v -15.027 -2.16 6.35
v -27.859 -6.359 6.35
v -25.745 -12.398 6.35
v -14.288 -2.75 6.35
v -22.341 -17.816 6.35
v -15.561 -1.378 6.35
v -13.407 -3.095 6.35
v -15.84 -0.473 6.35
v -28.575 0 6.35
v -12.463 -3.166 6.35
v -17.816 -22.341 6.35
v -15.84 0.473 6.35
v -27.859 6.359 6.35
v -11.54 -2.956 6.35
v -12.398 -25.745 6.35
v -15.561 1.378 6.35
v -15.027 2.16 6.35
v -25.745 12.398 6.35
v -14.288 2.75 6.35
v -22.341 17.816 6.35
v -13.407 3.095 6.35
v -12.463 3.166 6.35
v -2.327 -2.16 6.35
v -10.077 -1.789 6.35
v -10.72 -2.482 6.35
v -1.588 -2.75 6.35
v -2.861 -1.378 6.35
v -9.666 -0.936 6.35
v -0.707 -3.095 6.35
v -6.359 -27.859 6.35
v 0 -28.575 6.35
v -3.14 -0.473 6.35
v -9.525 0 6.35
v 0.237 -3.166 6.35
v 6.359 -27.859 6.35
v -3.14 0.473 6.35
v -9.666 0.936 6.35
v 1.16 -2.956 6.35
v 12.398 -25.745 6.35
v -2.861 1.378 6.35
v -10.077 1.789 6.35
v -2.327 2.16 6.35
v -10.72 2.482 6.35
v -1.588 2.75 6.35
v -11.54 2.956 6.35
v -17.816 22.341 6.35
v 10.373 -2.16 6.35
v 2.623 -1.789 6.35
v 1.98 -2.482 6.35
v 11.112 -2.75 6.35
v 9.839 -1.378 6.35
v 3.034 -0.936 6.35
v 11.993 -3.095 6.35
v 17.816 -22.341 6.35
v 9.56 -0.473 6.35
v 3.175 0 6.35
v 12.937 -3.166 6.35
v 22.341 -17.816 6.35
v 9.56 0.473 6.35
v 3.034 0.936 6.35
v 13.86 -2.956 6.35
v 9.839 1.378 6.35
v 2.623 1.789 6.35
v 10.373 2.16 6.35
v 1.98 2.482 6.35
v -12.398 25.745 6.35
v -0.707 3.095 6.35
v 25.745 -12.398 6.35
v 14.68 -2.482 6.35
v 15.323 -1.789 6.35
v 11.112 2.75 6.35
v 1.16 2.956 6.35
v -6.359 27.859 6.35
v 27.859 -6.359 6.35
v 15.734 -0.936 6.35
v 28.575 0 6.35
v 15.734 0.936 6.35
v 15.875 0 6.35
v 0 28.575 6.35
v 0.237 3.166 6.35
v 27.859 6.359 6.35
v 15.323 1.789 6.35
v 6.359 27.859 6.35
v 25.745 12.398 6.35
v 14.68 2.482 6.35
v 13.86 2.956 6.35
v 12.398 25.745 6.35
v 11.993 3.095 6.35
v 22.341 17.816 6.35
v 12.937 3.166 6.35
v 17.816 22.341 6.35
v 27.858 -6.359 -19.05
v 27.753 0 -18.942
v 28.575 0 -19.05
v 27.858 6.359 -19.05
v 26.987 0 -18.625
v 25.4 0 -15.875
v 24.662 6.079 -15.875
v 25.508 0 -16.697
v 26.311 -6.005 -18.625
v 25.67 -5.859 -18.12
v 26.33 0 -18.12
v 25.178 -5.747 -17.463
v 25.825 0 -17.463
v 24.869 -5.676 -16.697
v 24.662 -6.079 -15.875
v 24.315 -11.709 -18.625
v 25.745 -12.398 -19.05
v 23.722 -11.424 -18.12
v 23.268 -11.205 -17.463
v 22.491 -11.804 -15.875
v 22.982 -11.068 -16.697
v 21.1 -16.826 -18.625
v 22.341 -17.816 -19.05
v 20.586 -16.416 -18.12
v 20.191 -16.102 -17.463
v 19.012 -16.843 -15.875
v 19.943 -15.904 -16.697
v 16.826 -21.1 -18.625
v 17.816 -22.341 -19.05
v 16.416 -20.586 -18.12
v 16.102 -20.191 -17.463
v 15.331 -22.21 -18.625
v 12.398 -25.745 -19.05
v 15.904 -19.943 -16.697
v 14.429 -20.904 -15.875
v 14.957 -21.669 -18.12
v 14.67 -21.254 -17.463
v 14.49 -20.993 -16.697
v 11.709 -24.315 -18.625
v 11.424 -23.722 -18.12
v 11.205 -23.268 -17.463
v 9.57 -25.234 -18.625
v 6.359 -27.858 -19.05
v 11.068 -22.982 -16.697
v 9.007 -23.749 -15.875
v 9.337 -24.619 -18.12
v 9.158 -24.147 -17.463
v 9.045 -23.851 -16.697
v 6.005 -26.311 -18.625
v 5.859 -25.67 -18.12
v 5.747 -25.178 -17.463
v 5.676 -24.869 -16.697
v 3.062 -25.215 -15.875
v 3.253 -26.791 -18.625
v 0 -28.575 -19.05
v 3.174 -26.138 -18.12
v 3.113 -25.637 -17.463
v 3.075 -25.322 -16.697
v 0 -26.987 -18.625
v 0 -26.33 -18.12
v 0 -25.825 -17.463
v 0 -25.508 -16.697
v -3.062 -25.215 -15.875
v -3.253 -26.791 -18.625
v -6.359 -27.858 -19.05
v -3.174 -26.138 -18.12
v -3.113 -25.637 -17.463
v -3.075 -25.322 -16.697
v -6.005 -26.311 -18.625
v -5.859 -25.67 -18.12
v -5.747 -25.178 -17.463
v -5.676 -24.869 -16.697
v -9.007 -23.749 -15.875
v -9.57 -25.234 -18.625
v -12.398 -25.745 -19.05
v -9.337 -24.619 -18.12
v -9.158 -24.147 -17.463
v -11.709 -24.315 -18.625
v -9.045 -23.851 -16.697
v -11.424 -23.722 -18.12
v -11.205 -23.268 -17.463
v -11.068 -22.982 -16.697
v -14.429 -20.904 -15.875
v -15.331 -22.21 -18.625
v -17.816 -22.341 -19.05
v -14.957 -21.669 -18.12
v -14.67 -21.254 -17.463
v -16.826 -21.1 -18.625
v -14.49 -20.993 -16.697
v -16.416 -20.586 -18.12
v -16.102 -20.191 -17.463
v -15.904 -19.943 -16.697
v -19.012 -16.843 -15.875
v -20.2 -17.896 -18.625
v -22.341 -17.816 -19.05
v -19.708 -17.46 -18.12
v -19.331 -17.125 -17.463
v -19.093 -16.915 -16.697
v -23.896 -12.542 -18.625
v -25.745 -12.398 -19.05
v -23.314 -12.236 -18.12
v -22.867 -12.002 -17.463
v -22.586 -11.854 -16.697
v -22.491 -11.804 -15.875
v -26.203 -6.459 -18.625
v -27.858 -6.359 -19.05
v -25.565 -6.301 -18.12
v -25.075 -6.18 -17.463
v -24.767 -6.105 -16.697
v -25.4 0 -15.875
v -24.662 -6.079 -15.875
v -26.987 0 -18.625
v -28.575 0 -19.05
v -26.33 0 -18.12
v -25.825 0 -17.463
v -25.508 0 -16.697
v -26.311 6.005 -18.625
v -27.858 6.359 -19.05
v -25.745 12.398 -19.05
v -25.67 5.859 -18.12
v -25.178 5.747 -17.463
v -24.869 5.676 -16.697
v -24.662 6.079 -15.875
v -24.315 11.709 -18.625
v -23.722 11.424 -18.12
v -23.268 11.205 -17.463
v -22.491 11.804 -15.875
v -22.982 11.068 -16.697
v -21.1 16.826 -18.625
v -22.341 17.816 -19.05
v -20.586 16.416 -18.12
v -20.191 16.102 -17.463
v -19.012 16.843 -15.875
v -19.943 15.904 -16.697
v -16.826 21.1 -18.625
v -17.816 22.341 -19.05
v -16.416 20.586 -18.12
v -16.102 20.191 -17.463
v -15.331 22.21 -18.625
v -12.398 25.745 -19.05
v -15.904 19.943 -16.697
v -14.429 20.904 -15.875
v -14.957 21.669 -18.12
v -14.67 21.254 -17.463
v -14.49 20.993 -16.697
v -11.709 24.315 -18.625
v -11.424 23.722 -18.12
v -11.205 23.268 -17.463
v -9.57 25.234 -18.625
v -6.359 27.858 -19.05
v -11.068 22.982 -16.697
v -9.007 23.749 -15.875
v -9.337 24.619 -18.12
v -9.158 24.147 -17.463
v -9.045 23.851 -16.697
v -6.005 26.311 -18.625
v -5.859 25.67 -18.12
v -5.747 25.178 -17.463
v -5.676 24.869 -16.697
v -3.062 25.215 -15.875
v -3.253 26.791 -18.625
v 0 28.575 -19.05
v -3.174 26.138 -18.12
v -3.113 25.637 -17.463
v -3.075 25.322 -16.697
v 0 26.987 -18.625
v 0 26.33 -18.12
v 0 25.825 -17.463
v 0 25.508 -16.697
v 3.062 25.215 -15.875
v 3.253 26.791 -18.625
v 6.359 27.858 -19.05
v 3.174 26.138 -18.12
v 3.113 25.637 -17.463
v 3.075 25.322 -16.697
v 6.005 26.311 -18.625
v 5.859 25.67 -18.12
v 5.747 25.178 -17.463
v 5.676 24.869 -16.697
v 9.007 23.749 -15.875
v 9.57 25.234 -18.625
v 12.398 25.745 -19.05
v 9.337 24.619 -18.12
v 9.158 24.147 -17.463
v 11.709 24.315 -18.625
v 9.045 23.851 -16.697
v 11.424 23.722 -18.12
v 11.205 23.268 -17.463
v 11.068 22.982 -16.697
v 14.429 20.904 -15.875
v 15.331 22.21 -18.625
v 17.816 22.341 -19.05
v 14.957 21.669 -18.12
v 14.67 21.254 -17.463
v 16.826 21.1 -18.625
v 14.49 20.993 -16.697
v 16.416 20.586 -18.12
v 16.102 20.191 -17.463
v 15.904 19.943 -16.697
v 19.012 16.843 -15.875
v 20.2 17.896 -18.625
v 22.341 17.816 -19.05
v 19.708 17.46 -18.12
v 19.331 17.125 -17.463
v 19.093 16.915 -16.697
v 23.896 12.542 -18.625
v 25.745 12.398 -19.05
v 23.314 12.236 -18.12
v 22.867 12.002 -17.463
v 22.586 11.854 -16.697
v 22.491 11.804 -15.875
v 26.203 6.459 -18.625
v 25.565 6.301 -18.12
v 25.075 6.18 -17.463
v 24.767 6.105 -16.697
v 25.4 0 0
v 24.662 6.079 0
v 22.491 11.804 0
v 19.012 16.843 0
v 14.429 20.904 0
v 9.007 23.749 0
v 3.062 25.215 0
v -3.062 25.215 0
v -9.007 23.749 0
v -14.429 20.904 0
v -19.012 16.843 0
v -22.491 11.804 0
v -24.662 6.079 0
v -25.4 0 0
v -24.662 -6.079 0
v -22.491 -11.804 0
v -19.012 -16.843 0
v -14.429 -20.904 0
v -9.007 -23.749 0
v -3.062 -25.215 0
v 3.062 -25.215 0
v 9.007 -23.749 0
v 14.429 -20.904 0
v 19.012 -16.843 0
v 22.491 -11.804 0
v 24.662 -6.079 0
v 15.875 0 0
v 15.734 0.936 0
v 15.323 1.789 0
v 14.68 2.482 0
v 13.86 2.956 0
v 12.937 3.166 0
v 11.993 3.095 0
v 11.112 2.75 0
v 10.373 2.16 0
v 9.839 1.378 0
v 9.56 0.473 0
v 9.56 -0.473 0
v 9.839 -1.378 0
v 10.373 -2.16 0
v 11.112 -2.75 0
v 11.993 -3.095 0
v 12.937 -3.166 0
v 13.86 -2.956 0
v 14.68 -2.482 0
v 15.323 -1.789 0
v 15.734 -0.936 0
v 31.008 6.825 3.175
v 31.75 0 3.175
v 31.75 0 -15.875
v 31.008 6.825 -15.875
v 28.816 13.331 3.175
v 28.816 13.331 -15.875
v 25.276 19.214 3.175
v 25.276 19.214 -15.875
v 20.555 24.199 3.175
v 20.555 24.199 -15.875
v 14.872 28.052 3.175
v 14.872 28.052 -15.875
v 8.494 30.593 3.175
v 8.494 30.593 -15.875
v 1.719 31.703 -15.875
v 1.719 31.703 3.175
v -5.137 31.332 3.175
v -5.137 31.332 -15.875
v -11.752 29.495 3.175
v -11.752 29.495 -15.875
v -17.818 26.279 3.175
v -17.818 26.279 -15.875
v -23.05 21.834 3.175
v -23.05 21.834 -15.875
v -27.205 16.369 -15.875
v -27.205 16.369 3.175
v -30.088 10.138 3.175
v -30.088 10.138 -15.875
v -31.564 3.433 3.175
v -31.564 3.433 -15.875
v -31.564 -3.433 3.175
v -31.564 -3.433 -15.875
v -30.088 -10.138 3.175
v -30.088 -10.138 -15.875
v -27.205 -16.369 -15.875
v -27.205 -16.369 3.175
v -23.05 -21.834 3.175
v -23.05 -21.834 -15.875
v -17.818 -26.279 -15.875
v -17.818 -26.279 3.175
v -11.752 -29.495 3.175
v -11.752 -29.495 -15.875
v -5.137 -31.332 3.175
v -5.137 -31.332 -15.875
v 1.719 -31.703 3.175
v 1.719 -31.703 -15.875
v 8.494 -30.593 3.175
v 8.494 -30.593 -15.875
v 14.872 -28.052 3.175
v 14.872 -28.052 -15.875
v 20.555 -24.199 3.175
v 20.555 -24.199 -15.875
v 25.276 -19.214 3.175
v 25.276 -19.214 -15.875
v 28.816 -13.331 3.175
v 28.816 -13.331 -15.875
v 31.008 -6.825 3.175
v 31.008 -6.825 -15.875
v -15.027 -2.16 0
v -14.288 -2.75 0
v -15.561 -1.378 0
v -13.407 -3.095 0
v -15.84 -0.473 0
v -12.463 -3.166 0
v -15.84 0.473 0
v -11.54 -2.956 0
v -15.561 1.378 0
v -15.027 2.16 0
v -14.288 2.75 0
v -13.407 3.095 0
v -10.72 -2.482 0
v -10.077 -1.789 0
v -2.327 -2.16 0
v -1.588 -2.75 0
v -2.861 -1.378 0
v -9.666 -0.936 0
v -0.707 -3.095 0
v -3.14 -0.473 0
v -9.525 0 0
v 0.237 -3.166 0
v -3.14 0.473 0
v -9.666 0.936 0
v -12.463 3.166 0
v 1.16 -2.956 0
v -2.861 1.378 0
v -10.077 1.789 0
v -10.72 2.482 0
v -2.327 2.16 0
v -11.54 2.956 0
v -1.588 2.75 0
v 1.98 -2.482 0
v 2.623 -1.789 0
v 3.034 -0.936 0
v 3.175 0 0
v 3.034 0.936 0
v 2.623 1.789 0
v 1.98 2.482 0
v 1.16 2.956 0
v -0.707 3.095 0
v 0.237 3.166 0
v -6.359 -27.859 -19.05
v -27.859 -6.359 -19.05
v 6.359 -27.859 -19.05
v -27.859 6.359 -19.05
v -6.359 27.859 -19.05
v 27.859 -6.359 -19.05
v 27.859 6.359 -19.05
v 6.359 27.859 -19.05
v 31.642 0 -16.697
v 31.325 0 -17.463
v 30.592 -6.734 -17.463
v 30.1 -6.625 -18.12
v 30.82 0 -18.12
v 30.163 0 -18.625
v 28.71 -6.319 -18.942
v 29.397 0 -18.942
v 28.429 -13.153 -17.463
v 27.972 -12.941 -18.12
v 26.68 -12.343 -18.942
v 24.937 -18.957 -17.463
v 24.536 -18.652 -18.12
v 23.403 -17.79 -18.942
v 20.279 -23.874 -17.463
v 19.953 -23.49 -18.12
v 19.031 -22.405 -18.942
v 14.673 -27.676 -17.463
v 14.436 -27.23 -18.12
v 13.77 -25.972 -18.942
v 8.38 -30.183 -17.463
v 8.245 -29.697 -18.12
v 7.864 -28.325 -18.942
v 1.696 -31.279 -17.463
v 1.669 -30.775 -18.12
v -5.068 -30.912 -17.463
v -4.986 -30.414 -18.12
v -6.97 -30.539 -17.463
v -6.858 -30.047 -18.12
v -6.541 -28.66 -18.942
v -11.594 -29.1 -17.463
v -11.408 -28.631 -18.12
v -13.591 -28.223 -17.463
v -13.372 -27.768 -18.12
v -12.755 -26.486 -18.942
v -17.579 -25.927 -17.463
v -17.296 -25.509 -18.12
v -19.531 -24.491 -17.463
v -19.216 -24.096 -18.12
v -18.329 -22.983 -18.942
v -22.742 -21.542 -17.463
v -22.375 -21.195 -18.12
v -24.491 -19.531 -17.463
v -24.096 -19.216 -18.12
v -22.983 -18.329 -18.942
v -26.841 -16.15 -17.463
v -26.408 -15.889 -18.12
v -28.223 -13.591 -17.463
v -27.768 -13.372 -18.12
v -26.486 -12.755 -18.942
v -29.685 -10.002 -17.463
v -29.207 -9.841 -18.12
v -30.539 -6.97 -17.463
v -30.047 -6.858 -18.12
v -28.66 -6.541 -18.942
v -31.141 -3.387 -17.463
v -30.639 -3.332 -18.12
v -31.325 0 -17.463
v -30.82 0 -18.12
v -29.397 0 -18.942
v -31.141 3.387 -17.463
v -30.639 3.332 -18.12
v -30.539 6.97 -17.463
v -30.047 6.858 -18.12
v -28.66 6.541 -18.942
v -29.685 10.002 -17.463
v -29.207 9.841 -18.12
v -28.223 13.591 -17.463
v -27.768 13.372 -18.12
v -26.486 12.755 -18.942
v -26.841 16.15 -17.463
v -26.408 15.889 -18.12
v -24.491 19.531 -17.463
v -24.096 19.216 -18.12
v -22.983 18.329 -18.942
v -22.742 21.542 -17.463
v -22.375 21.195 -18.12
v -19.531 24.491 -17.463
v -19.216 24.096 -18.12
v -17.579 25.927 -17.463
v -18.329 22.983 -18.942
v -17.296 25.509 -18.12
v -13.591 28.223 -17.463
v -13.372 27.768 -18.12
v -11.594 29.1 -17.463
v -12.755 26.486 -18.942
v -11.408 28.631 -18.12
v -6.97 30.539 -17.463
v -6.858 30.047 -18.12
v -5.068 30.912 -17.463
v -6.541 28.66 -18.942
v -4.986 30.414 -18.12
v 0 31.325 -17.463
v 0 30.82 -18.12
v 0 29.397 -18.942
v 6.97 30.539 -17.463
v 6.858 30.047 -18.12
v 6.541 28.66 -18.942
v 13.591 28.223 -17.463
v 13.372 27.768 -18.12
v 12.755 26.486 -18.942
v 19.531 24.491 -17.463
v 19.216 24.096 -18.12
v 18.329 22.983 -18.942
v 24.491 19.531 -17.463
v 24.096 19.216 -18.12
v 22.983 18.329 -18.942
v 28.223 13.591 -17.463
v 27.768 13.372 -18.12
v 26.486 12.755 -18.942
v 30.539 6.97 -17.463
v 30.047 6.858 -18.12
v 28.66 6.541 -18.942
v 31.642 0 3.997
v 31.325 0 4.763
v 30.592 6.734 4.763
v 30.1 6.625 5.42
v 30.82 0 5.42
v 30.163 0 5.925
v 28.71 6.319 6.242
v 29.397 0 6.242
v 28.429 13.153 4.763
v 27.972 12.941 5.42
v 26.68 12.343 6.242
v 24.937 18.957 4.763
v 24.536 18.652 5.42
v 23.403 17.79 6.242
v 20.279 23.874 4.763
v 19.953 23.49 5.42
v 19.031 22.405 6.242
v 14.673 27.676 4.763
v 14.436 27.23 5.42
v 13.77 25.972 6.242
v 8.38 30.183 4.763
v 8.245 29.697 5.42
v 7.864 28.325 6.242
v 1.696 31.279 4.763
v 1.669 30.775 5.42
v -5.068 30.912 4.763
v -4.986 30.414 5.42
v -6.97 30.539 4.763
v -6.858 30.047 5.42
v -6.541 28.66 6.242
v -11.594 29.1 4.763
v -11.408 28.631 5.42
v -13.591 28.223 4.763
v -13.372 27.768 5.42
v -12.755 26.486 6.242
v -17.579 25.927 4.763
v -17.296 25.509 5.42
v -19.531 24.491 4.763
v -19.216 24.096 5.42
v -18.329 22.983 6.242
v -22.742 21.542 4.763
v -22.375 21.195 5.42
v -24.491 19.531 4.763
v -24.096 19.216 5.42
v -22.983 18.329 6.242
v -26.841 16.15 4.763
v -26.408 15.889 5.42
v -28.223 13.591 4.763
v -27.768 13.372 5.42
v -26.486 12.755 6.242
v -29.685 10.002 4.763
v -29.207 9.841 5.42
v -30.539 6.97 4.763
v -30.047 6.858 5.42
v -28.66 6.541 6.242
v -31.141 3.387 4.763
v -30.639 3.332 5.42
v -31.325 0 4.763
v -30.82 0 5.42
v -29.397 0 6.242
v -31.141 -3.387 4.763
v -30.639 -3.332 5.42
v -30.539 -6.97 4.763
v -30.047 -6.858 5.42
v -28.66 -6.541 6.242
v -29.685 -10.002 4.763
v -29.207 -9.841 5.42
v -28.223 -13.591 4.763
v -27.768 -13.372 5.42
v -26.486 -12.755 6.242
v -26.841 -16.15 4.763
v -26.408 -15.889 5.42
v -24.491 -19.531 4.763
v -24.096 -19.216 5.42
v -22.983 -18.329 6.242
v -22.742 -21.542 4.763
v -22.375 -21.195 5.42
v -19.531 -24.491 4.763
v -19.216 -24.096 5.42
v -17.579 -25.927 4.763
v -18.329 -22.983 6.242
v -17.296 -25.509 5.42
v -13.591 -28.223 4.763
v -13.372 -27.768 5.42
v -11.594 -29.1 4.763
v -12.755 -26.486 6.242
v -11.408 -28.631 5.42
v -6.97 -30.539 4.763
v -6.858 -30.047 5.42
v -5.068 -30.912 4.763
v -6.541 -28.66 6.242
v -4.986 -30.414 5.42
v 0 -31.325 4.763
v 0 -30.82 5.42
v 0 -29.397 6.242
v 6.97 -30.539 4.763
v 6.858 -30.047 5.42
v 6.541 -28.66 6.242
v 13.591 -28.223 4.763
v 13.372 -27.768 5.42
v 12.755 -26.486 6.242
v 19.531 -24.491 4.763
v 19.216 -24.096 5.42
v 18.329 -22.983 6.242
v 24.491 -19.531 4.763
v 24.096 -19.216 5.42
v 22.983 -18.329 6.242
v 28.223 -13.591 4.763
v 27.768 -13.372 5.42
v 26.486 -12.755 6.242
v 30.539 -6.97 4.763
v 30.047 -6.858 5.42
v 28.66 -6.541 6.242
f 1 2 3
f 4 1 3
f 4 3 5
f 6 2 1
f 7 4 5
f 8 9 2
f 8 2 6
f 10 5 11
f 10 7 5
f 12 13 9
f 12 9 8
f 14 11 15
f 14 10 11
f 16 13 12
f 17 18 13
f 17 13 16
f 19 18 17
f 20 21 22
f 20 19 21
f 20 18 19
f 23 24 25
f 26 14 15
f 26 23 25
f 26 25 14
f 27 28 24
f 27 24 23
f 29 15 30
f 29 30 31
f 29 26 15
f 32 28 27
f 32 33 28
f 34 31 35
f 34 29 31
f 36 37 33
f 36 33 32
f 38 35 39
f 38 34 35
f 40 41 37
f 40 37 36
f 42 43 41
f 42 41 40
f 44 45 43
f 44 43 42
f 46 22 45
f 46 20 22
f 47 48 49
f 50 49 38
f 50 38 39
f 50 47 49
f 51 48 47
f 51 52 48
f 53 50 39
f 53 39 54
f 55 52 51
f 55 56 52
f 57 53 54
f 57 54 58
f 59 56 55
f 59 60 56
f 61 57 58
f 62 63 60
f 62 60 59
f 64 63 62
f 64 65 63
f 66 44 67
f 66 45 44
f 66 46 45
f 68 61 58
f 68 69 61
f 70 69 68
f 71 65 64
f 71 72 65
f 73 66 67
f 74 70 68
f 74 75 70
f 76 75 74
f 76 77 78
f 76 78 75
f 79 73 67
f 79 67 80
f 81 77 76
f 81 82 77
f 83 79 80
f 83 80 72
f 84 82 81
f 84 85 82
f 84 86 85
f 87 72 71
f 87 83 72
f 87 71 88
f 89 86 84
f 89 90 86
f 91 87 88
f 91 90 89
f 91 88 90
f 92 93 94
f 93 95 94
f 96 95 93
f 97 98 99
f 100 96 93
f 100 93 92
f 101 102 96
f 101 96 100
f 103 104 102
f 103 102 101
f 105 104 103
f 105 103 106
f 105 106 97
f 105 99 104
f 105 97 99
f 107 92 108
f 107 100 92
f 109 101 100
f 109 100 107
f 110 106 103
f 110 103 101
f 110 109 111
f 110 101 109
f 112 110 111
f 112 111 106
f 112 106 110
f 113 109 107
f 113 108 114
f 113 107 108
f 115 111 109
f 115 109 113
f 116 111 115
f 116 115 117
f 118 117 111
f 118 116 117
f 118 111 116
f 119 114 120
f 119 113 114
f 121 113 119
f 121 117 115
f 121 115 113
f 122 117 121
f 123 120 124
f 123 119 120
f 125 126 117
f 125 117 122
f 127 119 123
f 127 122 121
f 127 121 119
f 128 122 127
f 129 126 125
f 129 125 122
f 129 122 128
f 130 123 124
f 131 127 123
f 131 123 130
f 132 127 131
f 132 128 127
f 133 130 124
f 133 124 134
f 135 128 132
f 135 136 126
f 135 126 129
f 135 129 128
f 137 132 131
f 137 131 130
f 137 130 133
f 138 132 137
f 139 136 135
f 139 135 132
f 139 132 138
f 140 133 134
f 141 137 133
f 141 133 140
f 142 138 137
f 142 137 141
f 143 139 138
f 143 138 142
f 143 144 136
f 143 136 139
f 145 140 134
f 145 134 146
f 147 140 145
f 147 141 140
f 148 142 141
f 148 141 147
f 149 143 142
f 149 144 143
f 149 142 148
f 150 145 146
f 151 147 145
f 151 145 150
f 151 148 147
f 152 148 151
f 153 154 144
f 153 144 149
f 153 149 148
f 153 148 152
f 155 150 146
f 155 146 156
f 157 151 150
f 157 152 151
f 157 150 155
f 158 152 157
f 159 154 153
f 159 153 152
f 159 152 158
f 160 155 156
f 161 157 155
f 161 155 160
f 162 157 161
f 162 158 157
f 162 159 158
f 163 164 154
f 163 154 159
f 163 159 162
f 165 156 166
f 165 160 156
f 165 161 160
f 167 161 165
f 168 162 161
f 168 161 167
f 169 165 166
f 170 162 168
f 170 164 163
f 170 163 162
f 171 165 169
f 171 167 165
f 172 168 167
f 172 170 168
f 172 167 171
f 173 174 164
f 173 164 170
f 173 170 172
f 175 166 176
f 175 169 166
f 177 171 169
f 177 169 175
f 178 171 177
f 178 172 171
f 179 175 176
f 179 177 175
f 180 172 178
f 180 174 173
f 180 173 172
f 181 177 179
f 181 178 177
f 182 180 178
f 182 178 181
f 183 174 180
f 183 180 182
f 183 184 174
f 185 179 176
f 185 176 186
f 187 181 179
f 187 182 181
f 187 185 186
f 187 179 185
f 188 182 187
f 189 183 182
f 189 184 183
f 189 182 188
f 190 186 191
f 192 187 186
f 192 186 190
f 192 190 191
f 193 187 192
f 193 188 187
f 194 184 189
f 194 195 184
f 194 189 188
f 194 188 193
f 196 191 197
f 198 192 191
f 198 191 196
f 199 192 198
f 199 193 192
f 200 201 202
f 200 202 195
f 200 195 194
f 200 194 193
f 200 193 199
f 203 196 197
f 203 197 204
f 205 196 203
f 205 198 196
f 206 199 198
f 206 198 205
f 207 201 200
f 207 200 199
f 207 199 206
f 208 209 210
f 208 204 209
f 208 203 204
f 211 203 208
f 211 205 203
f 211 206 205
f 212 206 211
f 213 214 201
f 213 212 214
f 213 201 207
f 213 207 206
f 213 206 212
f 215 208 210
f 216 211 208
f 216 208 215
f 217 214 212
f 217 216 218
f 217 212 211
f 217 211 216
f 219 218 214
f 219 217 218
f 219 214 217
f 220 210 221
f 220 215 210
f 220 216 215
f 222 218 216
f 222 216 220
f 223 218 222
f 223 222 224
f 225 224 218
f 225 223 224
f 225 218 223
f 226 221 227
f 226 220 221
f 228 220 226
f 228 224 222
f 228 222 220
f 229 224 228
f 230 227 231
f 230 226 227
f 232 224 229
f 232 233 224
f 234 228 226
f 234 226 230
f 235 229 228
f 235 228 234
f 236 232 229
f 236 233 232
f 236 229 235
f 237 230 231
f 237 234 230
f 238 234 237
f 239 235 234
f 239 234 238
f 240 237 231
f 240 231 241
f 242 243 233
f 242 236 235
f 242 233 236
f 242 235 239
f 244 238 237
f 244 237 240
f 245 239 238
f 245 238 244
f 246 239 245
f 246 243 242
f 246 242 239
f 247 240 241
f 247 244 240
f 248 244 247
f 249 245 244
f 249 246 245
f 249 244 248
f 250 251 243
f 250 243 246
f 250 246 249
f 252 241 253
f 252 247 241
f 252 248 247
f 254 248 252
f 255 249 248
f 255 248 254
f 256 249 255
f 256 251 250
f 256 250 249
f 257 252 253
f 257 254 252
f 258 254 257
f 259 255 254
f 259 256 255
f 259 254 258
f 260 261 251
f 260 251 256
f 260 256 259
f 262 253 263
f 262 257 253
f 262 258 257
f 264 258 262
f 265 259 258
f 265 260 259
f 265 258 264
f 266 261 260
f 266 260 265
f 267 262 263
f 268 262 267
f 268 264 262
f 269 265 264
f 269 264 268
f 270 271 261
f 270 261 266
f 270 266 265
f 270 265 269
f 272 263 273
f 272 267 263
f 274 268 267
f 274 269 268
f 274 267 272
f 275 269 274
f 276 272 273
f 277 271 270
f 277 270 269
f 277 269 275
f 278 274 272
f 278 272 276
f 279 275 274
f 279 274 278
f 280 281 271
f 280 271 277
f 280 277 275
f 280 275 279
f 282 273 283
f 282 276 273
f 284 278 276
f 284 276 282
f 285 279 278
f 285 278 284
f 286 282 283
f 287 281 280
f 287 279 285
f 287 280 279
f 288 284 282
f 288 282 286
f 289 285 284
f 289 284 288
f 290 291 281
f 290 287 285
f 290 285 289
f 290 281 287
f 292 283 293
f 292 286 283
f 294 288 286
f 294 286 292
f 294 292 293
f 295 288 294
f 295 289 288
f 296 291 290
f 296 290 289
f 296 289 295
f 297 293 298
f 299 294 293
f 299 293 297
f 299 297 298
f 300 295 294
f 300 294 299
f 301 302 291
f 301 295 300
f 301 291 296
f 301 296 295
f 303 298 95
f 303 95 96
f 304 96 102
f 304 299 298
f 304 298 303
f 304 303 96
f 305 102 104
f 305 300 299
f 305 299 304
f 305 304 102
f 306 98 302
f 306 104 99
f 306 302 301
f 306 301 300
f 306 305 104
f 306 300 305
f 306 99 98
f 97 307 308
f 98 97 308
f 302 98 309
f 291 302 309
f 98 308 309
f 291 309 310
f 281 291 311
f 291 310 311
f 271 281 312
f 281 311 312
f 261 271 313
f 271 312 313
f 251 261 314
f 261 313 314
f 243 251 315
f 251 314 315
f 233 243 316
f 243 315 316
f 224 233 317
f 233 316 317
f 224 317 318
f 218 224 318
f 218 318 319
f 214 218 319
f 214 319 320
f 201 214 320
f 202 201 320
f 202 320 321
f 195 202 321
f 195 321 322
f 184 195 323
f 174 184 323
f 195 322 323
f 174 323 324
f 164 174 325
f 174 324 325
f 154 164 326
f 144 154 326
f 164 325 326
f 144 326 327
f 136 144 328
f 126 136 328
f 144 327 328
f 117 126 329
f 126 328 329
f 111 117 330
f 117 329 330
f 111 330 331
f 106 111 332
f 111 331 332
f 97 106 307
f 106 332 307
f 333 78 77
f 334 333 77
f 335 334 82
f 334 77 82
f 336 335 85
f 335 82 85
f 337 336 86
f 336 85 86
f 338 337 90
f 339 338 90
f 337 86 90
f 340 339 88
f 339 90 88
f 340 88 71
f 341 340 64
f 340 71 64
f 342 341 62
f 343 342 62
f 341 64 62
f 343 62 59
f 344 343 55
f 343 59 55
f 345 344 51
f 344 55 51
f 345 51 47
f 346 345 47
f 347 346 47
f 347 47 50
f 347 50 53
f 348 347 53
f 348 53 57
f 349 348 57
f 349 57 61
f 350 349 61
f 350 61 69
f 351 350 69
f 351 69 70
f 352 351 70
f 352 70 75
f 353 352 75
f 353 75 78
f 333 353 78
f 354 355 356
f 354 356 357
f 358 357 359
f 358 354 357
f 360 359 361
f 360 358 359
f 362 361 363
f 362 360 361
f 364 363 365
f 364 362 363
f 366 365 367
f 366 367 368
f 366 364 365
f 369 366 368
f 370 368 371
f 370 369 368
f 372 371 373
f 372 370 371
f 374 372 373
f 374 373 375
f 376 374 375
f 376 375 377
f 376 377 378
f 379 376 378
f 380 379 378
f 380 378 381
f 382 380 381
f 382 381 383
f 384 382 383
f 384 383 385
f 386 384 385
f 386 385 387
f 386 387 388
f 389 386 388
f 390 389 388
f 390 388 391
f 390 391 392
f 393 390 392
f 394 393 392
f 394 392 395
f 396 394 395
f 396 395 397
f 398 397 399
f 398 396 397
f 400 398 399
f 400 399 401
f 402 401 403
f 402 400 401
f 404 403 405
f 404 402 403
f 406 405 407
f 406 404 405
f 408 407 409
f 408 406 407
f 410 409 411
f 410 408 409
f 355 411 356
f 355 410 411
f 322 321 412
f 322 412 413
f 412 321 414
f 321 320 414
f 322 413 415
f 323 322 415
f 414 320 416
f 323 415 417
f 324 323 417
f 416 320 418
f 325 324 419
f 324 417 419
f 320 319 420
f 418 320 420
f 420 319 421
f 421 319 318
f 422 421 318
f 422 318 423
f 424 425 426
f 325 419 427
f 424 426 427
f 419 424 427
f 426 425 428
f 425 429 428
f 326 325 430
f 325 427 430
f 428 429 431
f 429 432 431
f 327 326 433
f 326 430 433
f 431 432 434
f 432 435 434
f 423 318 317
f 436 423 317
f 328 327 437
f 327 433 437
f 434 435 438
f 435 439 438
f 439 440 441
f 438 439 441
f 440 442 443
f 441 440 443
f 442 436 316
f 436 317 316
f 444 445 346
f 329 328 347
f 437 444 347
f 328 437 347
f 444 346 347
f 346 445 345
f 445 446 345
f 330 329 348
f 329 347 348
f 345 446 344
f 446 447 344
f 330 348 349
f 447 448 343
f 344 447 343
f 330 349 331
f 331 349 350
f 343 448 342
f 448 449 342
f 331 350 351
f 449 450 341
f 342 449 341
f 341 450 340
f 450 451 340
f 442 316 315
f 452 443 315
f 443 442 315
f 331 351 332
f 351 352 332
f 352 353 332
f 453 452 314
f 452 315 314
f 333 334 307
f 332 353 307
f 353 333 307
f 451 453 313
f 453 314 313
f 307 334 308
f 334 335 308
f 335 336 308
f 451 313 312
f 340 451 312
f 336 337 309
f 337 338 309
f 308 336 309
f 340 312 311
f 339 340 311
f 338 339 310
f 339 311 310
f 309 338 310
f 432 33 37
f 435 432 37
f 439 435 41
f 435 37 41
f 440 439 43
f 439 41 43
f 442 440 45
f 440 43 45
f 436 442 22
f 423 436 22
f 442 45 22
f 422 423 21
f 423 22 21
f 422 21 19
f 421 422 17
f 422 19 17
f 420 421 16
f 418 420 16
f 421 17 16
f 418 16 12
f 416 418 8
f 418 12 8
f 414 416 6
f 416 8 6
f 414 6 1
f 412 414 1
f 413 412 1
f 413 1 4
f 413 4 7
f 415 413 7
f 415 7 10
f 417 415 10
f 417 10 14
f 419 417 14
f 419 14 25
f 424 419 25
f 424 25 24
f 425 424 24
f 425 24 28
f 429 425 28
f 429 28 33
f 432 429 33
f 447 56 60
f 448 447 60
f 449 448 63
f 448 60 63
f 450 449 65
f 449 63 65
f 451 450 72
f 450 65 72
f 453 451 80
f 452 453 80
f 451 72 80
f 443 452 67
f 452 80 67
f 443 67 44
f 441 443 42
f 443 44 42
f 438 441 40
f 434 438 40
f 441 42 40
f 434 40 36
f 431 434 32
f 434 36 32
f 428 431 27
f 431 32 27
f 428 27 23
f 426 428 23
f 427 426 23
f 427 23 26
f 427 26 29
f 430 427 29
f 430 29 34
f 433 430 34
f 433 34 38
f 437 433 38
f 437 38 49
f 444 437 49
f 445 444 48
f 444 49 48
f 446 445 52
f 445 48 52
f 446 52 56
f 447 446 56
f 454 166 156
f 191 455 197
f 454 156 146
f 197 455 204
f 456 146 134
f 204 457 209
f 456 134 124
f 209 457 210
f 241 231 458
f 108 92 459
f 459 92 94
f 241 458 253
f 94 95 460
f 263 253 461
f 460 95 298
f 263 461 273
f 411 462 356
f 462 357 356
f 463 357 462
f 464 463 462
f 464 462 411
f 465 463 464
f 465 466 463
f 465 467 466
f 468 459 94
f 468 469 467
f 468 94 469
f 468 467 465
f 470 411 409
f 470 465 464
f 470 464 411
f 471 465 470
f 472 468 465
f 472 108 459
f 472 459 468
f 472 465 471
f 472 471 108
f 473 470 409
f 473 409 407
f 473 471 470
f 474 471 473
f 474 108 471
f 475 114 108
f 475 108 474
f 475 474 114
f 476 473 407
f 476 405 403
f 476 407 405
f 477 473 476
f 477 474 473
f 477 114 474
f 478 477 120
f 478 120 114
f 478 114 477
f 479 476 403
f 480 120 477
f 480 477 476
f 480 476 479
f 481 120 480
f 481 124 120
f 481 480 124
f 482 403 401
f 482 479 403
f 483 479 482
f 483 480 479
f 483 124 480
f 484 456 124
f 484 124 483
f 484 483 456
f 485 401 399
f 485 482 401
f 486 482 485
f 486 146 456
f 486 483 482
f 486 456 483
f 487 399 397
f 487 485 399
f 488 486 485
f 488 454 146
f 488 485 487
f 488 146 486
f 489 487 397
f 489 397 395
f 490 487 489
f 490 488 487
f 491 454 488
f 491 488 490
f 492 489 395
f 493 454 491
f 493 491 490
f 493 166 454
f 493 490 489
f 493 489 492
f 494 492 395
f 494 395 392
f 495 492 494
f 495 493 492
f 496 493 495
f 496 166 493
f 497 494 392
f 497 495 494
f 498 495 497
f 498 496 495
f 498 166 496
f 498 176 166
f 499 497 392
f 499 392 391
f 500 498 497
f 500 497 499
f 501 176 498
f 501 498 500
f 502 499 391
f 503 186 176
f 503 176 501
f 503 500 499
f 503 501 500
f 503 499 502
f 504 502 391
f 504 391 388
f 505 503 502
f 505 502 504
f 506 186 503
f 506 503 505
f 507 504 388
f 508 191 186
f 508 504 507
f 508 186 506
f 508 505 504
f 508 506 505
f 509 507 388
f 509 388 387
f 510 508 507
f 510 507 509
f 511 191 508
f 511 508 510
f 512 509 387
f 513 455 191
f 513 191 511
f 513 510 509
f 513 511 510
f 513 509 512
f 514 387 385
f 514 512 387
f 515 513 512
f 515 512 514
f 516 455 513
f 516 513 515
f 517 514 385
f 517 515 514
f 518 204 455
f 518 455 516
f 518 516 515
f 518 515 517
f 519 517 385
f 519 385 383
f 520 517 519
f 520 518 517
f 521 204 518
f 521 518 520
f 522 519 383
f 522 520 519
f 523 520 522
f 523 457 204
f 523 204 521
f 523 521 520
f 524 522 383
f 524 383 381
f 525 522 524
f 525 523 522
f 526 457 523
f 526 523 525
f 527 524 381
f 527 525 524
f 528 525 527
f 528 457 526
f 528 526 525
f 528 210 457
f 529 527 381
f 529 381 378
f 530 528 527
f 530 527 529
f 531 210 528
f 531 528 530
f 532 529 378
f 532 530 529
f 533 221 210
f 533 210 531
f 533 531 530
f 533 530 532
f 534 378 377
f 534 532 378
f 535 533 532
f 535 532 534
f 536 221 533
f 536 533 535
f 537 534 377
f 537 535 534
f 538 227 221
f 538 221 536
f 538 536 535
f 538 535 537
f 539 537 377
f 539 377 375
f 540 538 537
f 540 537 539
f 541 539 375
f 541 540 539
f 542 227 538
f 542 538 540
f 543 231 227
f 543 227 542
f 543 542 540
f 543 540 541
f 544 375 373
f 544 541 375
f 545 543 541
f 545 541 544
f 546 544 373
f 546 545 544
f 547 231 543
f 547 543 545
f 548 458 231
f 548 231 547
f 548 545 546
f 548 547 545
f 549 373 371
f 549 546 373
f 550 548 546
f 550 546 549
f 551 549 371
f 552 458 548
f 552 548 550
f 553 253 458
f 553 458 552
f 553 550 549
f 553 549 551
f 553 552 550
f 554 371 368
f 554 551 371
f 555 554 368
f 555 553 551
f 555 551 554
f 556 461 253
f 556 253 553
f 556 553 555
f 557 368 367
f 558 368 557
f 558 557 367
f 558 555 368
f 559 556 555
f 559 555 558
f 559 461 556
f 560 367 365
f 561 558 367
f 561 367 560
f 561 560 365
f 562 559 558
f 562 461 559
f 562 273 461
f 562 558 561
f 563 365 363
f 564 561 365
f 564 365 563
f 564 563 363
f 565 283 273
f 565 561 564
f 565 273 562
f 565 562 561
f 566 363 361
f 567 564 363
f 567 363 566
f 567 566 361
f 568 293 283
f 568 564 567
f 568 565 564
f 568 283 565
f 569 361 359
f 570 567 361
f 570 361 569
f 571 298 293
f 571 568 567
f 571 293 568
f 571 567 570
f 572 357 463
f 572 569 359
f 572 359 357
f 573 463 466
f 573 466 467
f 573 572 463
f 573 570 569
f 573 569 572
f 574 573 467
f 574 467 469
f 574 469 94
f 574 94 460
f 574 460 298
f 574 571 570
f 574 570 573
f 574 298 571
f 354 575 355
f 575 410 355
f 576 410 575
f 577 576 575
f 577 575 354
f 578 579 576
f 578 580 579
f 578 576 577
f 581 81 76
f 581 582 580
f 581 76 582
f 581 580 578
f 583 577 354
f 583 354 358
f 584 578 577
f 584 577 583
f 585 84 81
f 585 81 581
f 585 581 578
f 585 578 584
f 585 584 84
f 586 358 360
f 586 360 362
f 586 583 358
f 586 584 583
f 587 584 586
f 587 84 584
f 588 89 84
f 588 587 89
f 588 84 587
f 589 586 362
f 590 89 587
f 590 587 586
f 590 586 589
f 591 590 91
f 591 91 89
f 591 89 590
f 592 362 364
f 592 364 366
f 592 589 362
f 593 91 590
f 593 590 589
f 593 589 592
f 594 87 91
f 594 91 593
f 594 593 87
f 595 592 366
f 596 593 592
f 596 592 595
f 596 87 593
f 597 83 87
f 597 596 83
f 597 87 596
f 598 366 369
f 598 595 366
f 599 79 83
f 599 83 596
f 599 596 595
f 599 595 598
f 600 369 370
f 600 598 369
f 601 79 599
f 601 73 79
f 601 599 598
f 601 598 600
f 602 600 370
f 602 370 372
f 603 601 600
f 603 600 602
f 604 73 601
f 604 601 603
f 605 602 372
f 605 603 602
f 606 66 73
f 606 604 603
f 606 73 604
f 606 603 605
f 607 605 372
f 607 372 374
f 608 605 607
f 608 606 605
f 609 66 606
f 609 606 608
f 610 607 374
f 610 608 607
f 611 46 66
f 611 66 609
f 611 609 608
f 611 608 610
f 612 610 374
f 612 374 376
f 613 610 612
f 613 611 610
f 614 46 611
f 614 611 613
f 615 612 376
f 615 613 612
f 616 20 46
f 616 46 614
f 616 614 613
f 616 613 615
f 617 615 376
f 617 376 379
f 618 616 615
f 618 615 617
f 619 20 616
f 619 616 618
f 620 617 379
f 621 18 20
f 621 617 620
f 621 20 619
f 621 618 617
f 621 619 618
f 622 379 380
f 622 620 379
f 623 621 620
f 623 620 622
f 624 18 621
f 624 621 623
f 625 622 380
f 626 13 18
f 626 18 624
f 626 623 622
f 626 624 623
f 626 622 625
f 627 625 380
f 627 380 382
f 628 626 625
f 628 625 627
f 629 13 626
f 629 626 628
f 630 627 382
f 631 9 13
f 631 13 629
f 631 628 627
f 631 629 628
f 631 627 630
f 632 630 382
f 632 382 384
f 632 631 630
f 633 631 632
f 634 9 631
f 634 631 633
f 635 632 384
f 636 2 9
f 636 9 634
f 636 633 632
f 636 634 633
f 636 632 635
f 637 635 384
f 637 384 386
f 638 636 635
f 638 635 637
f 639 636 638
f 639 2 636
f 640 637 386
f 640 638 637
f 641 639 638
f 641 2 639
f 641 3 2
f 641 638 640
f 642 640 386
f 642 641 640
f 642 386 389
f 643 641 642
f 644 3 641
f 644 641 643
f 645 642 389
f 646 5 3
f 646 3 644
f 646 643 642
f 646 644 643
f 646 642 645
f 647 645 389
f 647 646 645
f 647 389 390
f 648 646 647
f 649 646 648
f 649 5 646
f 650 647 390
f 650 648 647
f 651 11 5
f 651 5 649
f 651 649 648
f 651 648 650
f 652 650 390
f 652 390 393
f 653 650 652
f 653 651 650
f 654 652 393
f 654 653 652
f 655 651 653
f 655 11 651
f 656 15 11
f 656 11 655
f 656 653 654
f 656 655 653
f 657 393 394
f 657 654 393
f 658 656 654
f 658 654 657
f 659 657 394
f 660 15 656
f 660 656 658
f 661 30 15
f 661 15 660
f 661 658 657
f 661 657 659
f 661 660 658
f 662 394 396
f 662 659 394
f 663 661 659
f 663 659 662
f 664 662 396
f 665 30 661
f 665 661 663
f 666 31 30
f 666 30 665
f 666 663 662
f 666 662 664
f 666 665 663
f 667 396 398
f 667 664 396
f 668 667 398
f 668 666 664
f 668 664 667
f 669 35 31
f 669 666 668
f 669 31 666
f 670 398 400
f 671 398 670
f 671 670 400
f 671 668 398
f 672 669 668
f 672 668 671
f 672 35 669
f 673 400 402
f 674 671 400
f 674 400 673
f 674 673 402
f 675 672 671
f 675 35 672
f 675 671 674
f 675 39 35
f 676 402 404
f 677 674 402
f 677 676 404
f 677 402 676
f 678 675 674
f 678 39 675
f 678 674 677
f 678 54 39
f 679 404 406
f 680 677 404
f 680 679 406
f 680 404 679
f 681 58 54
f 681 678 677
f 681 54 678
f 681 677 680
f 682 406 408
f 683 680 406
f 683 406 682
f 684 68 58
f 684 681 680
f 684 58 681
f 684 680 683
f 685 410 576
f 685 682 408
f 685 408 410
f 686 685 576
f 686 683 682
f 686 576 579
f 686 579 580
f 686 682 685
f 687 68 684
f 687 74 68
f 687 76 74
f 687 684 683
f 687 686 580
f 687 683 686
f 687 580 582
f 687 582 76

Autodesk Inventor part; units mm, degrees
ref_plane "YZ Plane" through (0, 0, 0) normal (1, 0, 0) x (0, 1, 0)
ref_plane "XZ Plane" through (0, 0, 0) normal (0, 1, 0) x (-1, 0, 0)
ref_plane "XY Plane" through (0, 0, 0) normal (0, 0, 1) x (1, 0, 0)
sketch "Sketch1" plane through (0, 0, 0) normal (0, 0, 1) x (1, 0, 0)
  circle A0 centre (0, 0) radius 25.4
  circle A1 centre (0, 0) radius 31.75
  dimension "d1" = 50.8
  dimension "d2" = 6.35
extrude "Ring" add sketch "Sketch1" against normal blind 19.05
extrude "Back" add sketch "Sketch1" along normal blind 6.35 contours A0 | A1
sketch "Sketch2" plane through (0, 0, 6.35) normal (0, 0, 1) x (1, 0, 0)
  circle A0 centre (0, 0) radius 3.175
  circle A1 centre (-12.7, 0) radius 3.175
  circle A2 centre (12.7, 0) radius 3.175
  line L0 (-12.7, 0) -> (12.7, 0) construction
  dimension "d7" = 6.35
  dimension "d8" = 12.7
  dimension "d11" = 12.7
extrude "Holes" cut sketch "Sketch2" against normal through all
fillet "Fillets" radius 3.175 3 edges at (-31.75, 0, 6.35) (-31.75, 0, -19.05) (-25.4, 0, -19.05)
properties part number "friction-fit"
